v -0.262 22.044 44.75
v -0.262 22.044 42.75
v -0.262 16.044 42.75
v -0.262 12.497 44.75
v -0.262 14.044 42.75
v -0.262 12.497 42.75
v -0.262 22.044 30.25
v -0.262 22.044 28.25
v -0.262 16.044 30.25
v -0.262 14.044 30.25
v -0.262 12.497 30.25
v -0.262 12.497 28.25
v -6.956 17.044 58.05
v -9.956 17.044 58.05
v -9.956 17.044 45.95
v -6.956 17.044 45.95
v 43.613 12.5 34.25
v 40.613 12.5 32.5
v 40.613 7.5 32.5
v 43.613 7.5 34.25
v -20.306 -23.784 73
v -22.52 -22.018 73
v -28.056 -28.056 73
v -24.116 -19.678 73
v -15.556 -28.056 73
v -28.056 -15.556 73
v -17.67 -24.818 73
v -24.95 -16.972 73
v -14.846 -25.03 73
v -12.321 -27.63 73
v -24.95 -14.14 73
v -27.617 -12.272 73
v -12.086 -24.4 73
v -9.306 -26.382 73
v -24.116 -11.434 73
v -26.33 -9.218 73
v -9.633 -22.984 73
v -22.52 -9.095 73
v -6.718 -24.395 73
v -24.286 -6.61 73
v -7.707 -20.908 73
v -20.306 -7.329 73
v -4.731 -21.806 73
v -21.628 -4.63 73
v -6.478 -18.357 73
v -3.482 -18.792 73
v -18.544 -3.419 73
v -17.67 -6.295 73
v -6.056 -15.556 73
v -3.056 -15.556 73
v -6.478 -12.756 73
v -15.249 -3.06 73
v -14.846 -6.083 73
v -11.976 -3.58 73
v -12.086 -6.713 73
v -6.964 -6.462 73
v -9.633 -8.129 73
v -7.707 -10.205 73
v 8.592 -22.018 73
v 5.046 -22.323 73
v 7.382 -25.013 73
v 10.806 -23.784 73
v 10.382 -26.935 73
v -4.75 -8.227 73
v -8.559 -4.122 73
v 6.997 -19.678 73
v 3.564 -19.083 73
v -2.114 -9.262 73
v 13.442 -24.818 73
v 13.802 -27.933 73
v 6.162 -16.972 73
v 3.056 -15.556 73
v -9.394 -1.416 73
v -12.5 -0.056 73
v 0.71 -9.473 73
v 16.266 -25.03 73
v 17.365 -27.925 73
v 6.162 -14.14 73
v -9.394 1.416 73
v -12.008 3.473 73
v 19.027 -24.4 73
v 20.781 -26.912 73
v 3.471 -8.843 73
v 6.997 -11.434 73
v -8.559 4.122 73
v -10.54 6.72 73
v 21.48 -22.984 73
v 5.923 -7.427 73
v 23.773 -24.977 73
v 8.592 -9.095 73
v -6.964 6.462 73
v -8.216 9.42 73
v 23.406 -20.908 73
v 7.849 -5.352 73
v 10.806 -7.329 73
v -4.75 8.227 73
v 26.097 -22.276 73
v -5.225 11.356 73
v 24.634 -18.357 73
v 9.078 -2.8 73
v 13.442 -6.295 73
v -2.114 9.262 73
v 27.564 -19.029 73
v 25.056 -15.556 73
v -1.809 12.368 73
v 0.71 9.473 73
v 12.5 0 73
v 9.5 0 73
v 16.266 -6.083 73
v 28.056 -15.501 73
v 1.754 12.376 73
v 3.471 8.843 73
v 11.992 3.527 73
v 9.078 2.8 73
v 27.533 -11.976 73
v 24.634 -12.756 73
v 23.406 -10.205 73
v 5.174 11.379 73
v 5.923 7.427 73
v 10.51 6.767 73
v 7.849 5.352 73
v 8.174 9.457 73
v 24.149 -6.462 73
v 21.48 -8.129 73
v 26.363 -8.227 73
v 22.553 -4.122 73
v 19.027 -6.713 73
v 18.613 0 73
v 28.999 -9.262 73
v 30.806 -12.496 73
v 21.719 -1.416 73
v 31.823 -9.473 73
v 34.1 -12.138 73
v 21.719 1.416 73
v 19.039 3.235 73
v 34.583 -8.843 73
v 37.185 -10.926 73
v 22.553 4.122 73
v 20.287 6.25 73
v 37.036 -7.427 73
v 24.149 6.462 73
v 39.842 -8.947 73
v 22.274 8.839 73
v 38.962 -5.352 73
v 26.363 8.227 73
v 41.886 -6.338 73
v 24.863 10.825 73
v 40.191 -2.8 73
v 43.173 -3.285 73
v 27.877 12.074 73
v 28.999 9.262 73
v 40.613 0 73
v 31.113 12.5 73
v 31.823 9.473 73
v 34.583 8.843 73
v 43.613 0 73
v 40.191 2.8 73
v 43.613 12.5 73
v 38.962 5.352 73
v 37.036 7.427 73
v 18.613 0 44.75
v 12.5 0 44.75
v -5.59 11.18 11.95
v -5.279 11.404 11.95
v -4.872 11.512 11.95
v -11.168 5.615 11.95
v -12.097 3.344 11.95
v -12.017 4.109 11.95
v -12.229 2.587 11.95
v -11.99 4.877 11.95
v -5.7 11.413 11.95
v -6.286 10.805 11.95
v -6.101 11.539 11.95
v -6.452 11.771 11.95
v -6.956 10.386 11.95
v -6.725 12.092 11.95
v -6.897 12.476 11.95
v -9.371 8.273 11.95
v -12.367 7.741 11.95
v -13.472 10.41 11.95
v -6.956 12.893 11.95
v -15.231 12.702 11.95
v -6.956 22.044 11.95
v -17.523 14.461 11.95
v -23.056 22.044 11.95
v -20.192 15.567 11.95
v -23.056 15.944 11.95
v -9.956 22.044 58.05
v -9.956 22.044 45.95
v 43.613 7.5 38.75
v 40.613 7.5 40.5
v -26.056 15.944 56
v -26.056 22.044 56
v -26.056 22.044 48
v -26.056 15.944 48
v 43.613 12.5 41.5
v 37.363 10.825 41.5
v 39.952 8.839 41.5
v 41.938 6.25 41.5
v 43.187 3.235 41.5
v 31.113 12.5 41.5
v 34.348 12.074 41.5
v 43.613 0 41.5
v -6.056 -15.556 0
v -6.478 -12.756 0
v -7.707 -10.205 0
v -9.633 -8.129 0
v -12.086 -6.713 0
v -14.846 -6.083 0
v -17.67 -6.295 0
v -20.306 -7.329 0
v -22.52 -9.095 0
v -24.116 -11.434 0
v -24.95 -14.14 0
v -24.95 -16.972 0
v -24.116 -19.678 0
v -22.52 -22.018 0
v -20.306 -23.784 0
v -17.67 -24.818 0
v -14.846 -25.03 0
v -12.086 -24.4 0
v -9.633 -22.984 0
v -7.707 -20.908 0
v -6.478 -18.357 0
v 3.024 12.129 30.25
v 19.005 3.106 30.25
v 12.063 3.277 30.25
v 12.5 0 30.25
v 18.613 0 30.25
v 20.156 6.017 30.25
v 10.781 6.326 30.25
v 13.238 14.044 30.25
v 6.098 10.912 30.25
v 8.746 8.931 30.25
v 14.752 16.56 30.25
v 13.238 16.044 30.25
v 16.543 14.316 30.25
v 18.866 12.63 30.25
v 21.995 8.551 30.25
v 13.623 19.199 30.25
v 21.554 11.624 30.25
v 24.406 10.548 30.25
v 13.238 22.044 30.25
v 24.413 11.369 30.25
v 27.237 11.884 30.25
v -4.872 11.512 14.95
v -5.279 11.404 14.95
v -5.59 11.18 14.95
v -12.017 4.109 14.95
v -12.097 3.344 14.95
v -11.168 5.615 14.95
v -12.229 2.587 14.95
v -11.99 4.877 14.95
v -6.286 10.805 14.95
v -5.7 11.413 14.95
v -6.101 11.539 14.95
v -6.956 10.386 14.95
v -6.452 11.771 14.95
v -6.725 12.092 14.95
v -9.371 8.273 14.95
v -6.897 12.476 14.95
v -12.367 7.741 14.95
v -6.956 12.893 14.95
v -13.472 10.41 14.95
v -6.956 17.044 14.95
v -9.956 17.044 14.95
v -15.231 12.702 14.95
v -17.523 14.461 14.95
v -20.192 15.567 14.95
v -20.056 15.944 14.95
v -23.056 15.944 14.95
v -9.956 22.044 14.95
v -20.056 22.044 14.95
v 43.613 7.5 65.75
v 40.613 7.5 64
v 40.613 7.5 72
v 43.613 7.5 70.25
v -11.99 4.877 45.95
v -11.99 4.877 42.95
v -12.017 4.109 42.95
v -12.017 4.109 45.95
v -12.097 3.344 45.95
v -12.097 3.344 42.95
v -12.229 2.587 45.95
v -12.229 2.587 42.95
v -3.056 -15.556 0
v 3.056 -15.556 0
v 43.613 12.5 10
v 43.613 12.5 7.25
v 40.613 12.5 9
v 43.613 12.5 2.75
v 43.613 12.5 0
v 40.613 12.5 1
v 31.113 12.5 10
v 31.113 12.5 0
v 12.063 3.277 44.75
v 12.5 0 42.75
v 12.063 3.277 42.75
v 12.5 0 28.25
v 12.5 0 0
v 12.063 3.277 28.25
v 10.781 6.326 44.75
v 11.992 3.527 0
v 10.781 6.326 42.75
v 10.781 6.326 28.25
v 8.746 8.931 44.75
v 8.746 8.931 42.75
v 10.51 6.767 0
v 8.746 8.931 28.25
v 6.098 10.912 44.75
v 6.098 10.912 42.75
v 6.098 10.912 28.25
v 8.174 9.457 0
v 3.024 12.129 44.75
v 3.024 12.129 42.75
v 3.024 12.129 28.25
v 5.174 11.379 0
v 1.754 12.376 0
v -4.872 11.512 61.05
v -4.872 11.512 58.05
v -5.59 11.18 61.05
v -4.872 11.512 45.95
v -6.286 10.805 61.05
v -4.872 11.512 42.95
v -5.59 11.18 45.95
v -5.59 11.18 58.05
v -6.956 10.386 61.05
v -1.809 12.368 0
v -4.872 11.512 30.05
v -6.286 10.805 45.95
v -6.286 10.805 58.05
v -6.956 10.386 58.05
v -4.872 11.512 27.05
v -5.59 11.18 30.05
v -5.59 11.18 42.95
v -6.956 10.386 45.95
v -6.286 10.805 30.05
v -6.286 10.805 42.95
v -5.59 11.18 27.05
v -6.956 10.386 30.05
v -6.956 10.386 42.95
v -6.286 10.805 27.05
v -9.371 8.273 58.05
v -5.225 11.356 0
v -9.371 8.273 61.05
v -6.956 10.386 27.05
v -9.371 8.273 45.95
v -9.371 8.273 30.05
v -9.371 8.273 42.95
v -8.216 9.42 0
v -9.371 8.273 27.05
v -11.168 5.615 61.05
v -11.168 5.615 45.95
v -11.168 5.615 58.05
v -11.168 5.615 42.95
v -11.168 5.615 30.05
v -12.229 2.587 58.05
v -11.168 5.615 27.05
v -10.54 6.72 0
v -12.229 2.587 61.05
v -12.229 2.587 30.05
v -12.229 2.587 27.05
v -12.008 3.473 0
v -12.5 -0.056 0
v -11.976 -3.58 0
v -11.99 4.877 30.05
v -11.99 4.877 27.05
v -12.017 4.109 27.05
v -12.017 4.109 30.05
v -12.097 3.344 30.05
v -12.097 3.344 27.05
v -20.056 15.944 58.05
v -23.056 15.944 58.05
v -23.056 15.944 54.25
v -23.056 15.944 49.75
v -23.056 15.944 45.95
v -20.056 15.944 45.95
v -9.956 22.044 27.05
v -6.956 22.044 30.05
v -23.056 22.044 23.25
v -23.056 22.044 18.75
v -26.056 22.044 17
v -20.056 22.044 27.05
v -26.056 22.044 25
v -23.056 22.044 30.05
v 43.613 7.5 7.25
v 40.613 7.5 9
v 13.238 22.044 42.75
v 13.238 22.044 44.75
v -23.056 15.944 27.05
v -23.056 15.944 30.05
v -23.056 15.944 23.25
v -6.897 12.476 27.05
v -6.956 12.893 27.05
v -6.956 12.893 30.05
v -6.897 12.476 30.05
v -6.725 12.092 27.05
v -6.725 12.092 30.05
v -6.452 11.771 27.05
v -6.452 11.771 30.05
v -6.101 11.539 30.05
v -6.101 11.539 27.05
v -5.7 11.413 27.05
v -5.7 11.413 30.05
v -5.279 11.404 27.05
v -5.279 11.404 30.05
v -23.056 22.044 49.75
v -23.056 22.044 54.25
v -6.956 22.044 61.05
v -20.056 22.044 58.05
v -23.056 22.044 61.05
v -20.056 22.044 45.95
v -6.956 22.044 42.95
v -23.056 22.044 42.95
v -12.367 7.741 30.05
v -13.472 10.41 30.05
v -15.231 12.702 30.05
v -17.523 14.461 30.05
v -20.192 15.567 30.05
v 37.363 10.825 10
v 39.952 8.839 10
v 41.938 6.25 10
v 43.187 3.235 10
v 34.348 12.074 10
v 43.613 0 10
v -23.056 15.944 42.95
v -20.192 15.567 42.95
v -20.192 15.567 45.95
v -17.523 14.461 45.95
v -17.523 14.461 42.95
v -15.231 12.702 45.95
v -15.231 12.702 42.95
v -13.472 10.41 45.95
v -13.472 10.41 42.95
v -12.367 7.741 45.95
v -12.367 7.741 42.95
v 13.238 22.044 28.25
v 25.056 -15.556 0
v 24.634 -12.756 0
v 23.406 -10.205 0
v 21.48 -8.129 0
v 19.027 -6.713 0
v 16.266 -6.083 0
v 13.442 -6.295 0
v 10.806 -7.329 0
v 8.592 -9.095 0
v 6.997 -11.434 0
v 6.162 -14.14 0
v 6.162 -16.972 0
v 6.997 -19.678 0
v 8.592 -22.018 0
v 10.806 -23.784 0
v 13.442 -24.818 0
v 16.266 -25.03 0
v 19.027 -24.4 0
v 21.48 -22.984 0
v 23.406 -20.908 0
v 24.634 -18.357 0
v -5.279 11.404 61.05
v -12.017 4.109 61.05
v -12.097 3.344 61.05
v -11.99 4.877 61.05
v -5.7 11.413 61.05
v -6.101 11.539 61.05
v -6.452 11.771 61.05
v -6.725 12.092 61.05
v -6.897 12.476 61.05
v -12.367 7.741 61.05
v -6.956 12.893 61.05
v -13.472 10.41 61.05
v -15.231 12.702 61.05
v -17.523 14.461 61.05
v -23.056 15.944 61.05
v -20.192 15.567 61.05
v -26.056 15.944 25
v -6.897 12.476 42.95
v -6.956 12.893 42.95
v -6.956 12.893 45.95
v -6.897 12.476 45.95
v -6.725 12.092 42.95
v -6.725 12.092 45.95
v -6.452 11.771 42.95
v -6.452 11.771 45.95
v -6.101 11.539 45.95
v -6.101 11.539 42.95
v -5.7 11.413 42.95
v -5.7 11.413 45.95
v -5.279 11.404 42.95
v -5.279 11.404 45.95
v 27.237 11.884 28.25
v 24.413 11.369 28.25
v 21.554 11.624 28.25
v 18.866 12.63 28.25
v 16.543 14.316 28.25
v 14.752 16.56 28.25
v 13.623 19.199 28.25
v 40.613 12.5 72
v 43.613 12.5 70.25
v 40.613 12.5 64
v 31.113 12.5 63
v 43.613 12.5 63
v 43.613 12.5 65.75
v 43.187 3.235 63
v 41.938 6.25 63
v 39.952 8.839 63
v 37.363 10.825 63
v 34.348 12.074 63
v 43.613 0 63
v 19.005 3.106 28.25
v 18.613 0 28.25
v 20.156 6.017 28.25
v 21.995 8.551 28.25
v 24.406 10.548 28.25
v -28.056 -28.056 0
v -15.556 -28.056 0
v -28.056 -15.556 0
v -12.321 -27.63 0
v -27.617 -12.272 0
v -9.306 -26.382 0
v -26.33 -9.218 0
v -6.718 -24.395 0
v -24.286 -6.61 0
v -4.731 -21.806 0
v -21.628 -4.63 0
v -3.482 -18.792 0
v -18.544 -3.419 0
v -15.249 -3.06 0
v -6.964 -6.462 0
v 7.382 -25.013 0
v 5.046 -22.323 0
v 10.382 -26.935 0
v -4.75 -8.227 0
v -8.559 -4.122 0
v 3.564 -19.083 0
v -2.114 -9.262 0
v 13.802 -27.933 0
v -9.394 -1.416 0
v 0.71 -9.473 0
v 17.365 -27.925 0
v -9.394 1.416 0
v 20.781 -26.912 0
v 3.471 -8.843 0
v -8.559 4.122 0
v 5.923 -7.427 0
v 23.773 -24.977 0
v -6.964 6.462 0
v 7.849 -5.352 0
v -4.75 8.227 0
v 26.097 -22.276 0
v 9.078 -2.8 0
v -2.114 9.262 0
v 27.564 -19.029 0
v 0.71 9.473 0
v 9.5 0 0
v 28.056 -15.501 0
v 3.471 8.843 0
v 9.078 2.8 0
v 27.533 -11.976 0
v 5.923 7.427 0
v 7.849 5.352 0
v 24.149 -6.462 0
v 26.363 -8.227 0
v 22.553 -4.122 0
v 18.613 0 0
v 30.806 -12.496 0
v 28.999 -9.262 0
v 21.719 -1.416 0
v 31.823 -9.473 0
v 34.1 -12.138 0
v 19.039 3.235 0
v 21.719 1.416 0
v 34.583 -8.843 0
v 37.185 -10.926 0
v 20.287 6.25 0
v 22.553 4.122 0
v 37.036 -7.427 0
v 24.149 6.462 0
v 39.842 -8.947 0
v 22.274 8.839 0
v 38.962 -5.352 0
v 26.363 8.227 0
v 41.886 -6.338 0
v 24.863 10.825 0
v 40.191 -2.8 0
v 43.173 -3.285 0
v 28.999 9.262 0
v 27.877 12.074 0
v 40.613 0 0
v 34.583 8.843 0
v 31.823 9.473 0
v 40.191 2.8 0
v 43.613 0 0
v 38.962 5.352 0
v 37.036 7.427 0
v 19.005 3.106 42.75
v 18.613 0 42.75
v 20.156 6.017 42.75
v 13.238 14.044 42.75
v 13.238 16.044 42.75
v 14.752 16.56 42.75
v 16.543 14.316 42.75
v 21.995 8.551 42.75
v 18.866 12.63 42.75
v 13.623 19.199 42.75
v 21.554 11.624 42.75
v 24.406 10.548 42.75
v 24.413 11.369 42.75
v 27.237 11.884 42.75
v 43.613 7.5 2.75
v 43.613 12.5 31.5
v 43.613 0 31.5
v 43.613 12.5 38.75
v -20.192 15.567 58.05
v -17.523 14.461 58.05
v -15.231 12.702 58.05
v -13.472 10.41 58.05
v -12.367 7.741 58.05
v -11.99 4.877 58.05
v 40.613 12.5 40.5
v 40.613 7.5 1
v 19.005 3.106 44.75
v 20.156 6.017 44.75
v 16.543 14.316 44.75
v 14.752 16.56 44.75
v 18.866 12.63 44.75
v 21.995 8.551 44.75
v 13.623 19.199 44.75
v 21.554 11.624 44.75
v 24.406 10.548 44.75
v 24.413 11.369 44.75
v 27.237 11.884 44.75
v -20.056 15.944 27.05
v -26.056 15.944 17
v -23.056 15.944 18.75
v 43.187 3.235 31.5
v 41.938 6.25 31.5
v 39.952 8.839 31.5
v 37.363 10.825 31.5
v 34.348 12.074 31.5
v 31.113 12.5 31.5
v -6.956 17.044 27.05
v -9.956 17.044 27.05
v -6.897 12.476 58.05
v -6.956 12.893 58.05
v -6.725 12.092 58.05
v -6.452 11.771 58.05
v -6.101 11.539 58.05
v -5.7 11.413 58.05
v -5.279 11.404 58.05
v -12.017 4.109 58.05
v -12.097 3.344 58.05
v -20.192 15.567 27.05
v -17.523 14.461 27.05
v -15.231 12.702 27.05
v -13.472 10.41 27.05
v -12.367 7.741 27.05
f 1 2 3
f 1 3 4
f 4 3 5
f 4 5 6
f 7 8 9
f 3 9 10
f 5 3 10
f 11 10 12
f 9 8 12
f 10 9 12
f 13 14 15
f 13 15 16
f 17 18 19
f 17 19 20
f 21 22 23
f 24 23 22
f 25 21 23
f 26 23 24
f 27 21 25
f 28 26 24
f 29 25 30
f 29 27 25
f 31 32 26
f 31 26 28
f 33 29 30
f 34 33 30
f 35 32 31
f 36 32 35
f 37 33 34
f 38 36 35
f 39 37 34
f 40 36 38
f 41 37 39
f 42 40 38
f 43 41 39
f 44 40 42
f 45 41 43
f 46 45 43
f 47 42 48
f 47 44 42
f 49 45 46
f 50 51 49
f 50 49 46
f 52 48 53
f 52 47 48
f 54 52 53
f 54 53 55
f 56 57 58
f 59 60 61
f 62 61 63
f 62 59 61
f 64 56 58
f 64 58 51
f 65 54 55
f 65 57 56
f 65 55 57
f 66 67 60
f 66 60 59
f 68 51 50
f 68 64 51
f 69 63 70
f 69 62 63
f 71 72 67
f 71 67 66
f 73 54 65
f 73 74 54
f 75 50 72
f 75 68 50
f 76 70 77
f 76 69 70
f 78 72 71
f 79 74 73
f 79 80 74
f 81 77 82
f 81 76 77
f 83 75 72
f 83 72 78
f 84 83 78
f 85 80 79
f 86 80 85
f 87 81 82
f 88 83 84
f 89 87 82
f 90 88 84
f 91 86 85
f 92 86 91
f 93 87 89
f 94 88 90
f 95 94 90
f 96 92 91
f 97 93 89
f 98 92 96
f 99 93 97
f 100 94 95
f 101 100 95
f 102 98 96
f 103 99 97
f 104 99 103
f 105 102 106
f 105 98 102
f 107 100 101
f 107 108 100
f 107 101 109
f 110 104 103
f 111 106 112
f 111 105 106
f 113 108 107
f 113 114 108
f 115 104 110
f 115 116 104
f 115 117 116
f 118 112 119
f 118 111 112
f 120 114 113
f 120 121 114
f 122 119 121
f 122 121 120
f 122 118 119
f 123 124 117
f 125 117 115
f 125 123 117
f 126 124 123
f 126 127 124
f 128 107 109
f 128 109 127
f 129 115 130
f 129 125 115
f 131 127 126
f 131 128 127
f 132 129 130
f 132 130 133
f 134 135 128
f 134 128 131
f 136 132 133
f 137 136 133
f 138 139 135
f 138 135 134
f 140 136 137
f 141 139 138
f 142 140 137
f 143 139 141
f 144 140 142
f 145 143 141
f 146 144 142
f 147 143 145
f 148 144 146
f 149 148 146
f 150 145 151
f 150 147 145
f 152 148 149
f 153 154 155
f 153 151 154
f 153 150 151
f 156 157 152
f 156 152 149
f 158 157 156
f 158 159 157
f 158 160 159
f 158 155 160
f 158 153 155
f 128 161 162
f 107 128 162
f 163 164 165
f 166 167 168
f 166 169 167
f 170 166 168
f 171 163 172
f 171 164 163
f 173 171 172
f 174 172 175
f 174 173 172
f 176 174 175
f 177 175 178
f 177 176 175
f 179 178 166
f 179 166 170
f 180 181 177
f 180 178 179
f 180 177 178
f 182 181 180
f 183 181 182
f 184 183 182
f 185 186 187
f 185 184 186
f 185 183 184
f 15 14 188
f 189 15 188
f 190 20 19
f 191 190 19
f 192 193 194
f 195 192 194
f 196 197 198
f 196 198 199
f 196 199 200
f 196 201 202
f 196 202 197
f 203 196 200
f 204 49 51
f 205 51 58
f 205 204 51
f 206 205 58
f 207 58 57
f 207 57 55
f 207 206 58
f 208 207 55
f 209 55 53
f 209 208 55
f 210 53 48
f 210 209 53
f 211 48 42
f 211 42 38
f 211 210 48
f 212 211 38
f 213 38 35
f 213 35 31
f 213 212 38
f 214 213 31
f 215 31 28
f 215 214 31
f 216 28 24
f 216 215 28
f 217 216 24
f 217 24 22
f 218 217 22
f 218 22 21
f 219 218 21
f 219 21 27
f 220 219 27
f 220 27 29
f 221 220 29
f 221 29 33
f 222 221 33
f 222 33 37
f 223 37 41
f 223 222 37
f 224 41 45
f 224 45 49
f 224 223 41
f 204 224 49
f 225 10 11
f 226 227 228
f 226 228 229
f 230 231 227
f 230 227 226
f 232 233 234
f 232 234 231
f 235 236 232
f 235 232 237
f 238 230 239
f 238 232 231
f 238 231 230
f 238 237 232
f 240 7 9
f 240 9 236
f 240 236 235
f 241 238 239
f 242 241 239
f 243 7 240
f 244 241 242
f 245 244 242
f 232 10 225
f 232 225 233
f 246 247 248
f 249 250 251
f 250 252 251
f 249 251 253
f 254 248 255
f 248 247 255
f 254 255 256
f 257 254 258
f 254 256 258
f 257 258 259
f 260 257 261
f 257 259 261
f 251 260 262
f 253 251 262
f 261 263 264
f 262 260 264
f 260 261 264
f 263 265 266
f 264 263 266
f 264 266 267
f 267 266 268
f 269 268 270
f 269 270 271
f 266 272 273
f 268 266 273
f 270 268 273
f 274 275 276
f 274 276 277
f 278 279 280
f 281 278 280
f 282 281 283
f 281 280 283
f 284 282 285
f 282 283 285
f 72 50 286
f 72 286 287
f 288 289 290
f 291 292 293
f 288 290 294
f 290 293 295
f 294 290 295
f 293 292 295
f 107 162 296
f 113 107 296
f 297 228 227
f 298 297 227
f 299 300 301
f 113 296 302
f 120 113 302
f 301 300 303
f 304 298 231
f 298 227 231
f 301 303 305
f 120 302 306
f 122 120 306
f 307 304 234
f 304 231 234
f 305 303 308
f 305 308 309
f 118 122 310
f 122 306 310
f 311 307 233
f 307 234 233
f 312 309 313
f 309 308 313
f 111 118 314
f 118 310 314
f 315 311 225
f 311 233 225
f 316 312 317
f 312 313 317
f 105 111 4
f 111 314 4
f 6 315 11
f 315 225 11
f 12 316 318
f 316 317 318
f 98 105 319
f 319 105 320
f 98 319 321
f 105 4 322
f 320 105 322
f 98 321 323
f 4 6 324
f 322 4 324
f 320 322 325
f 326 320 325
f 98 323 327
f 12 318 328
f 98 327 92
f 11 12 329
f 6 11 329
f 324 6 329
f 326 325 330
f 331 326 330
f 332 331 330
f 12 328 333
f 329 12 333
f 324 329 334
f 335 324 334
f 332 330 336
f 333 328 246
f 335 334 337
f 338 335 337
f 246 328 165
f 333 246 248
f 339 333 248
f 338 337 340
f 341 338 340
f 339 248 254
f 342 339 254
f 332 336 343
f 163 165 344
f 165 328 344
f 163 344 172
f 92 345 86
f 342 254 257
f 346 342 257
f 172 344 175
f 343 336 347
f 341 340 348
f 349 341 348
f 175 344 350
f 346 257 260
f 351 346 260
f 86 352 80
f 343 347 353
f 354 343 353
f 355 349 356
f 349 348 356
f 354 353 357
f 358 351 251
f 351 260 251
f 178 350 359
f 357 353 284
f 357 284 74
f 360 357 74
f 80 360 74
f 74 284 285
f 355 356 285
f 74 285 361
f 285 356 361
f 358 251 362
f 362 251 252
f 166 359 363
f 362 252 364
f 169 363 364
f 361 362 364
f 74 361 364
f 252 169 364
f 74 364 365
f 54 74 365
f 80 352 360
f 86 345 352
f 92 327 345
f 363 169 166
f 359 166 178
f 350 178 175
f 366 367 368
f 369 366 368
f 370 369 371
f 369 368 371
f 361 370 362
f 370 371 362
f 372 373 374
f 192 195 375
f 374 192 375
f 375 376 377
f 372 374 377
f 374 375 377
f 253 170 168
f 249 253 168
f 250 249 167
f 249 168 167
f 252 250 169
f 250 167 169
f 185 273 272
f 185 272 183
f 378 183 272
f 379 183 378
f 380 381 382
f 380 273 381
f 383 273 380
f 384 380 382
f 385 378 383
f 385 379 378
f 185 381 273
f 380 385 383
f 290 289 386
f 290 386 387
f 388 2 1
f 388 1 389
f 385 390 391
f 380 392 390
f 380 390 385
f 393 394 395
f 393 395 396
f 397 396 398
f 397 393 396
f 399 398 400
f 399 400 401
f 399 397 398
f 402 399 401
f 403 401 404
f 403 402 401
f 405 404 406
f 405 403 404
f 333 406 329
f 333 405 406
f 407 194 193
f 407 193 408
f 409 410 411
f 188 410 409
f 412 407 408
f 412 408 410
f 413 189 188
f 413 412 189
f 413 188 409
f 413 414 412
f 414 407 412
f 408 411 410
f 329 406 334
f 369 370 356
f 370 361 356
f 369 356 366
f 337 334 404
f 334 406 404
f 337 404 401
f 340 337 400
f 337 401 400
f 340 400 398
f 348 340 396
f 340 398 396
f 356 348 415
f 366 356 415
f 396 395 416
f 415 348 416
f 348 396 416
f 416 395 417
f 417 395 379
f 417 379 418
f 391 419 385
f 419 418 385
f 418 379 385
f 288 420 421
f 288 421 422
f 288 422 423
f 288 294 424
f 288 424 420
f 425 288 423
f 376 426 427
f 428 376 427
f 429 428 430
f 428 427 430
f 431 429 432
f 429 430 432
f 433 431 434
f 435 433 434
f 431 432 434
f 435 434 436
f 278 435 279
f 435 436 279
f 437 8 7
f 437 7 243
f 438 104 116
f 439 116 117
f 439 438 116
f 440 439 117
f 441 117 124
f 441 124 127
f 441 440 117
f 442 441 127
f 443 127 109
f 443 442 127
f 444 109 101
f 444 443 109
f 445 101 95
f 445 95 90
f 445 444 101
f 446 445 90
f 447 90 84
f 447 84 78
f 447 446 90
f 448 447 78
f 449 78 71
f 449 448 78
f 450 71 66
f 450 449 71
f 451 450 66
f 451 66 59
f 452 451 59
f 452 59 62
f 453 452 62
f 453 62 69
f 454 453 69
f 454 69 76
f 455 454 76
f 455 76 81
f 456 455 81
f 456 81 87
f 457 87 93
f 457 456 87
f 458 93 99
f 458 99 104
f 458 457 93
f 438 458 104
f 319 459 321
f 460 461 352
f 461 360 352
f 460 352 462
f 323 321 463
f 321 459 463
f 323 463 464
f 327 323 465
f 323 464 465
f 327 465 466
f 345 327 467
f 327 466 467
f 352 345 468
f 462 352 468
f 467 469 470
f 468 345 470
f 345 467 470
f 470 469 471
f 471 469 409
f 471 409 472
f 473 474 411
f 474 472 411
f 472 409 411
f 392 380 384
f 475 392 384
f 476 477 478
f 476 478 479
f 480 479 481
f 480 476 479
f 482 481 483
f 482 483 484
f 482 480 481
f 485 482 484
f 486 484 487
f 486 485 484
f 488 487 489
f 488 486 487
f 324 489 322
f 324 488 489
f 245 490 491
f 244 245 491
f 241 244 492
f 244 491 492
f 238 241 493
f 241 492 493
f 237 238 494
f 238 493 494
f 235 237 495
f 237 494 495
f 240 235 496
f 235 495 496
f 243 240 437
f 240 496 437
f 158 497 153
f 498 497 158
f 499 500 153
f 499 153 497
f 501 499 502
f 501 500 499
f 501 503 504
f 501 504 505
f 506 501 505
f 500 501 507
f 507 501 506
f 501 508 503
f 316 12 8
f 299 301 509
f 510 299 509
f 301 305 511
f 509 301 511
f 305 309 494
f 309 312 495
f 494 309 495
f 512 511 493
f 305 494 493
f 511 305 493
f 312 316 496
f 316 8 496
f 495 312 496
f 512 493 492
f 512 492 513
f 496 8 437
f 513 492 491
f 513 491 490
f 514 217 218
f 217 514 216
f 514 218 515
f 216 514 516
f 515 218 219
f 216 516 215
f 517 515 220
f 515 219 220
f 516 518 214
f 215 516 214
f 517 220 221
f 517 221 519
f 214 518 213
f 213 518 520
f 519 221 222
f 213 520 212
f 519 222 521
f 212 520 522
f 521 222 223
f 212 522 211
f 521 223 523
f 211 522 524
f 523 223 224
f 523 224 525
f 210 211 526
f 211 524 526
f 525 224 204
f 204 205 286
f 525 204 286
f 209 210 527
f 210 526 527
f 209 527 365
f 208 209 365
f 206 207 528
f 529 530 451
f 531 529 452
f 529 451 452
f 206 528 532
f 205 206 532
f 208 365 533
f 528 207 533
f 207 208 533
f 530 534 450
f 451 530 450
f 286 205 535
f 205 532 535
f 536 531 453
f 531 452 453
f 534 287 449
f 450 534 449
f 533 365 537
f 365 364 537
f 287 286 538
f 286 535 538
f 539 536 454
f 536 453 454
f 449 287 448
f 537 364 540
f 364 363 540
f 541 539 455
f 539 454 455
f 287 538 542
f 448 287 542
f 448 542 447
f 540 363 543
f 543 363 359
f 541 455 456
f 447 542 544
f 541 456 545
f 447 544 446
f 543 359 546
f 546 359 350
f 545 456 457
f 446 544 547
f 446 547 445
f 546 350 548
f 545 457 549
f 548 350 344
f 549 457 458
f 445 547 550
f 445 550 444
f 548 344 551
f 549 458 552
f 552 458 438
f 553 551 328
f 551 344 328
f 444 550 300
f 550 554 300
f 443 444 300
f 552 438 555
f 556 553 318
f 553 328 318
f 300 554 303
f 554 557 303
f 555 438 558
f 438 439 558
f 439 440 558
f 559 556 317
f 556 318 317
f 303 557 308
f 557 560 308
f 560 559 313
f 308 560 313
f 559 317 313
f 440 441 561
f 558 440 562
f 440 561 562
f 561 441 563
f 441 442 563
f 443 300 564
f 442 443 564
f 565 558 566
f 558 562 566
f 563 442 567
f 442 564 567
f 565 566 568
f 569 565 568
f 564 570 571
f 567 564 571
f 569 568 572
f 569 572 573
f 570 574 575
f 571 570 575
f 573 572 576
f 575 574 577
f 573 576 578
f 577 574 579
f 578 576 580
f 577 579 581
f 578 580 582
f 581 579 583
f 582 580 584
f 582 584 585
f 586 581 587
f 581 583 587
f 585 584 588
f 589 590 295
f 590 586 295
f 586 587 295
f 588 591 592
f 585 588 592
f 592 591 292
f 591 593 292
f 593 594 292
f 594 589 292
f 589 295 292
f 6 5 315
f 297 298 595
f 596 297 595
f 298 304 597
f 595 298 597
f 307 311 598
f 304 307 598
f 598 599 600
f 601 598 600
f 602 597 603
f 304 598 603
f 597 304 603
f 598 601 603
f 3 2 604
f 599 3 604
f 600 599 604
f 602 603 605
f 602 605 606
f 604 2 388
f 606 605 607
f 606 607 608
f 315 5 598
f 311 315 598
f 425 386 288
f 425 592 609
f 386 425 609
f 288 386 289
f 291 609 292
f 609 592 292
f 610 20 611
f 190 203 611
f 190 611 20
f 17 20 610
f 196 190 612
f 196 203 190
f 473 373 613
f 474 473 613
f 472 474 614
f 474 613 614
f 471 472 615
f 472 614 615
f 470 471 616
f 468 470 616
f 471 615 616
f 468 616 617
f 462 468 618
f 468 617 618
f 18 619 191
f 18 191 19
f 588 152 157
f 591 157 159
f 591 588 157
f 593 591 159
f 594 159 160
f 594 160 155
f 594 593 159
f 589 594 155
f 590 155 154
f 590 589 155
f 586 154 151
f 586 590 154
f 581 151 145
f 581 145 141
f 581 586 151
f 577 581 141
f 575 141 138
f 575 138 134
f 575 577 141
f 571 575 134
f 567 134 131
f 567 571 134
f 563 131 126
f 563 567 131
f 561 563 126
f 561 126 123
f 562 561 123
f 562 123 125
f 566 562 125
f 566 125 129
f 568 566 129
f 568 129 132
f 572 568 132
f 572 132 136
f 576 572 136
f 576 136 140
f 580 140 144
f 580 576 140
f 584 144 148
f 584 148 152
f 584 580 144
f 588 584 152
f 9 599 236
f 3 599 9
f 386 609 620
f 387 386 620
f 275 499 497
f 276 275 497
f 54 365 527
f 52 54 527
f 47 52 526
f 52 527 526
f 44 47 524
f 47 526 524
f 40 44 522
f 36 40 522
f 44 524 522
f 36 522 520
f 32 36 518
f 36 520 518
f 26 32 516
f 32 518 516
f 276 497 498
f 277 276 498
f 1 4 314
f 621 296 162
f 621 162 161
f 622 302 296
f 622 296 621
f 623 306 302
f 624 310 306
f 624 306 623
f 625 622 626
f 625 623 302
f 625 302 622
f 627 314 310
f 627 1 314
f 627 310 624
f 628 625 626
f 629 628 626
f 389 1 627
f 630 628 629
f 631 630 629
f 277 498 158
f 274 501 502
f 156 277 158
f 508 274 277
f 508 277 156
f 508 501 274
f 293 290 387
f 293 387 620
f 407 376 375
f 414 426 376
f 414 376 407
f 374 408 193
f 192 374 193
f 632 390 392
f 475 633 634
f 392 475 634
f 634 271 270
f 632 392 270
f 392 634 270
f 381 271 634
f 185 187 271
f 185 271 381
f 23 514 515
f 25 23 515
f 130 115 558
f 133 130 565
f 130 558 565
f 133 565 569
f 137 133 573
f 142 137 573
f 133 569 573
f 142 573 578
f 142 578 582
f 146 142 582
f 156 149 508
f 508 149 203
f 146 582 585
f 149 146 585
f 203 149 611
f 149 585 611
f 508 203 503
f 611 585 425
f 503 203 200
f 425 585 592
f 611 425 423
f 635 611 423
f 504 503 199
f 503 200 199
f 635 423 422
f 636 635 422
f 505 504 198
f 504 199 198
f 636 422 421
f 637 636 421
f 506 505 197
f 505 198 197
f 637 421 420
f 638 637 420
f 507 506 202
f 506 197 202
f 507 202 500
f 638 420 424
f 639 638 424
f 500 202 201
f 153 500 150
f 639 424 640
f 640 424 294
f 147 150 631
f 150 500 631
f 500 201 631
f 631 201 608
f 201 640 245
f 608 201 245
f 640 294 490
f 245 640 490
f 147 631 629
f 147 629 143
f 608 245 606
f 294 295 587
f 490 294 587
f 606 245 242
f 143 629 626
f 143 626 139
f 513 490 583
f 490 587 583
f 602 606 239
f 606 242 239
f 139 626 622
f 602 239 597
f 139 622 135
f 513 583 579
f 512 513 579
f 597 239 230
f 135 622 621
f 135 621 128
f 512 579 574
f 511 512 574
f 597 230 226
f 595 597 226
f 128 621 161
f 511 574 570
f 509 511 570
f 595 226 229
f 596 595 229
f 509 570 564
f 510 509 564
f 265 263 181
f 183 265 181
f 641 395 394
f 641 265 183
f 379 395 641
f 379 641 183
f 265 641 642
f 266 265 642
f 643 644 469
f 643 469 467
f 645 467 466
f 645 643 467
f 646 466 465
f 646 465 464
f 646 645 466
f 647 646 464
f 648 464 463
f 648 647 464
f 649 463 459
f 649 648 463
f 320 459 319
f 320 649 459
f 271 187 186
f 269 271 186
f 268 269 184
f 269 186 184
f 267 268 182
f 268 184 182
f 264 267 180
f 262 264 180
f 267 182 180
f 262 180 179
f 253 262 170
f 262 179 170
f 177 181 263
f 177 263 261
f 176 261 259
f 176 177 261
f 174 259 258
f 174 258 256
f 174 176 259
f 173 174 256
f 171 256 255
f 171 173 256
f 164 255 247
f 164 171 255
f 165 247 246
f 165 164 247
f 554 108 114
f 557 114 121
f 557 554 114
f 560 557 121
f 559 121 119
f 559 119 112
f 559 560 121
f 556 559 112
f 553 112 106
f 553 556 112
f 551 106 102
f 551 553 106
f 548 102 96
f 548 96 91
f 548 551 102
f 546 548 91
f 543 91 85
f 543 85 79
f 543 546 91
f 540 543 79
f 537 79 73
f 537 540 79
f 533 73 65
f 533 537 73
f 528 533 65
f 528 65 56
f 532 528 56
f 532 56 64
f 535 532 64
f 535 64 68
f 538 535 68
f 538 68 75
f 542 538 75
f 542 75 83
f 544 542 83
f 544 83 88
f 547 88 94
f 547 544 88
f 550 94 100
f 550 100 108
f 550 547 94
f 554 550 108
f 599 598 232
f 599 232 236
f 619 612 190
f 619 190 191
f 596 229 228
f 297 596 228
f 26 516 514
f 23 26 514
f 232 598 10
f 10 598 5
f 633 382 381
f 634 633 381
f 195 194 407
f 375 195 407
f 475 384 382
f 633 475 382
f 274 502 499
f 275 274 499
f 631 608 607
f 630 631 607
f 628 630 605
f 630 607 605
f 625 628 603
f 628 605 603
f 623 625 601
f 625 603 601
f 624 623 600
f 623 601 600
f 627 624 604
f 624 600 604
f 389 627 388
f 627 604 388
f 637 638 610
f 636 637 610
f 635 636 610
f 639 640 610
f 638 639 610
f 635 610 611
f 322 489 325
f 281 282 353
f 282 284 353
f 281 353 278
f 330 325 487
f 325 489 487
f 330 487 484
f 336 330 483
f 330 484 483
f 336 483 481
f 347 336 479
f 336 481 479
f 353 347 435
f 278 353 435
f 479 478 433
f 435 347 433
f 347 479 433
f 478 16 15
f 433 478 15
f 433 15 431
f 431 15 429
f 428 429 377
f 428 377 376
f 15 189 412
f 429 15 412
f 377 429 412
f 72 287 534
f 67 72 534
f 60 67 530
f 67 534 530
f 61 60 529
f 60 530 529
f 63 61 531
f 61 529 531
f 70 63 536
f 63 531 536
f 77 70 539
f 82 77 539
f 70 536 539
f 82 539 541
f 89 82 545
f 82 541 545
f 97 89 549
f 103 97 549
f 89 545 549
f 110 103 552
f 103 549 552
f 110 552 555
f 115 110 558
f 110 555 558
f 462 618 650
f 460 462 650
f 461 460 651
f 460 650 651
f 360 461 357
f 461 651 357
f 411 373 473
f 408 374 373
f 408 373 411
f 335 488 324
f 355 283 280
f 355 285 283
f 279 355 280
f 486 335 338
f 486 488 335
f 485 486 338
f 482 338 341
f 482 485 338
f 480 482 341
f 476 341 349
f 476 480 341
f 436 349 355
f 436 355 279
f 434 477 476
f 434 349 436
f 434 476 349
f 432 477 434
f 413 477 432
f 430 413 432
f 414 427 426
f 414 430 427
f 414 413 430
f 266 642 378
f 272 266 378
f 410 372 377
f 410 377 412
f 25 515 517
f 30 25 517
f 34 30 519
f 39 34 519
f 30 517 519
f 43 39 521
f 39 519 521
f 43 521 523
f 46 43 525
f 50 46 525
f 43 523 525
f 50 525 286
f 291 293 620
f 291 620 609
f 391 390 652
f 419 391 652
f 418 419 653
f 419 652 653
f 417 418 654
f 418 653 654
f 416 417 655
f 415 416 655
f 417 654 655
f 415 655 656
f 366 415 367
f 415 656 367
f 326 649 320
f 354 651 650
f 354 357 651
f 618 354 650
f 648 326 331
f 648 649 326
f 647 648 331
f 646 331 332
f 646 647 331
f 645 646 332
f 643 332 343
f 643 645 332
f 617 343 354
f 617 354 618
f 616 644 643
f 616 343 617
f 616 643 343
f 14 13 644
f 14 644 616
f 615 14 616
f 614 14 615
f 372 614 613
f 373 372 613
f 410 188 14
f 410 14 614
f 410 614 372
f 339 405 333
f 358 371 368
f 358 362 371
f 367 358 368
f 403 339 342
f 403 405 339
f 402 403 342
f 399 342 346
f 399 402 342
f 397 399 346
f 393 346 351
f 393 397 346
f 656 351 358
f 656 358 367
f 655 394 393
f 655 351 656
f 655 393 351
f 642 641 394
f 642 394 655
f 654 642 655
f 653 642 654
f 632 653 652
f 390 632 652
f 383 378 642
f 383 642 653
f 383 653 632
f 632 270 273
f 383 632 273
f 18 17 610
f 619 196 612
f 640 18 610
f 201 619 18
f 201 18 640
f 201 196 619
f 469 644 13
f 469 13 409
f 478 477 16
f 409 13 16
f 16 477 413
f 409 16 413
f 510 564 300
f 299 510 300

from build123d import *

# Parameters (mm, degrees)
SKETCH_1_R          = 9.5
EXTRUDE_2_DEPTH     = 73
EXTRUDE_START       = -3
EXTRUDE_3_DEPTH     = 3
EXTRUDE_4_DEPTH     = 3
EXTRUDE_5_DEPTH     = 3
EXTRUDE_6_DEPTH     = 3
SKETCH_8_W          = 3
SKETCH_8_H          = 6.1
EXTRUDE_7_DEPTH     = 12.1
SKETCH_9_W          = 3
SKETCH_9_H          = 6.1
EXTRUDE_8_DEPTH     = 12.1
SKETCH_10_W         = 3
SKETCH_10_H         = 5
EXTRUDE_9_DEPTH     = 12.1
SKETCH_11_W         = 3
SKETCH_11_H         = 5
EXTRUDE_10_DEPTH    = 12.1
EXTRUDE_11_DEPTH    = 3
EXTRUDE_12_DEPTH    = 3
EXTRUDE_13_DEPTH    = 3
EXTRUDE_14_DEPTH    = 3
EXTRUDE_15_DEPTH    = 6.1
SKETCH_18_W         = 13.5
SKETCH_18_H         = 6
EXTRUDE_16_DEPTH    = 2
EXTRUDE_START_2     = -2
SKETCH_19_W         = 13.5
SKETCH_19_H         = 6
EXTRUDE_17_DEPTH    = 2
SKETCH_20_W         = 13.5
SKETCH_20_H         = 2
EXTRUDE_18_DEPTH    = 12.5
EXTRUDE_START_3     = -10
EXTRUDE_19_DEPTH    = 10
EXTRUDE_20_DEPTH    = 10
EXTRUDE_START_4     = 36.5
EXTRUDE_21_DEPTH    = 5
CUT_EXTRUDE_1_DEPTH = 5


with BuildPart() as part:
    # Эскиз1 → Бобышка-Вытянуть2 (new body)
    with BuildSketch(Plane.XY):
        with BuildLine():
            Line((-28.056349186, -15.556349186), (-28.056349186, -28.056349186))
            Line((-28.056349186, -28.056349186), (-15.556349186, -28.056349186))
            ThreePointArc((-15.556349186, -28.056349186), (-6.717514421, -24.395183951), (-3.056349186, -15.556349186))
            Line((-3.056349186, -15.556349186), (3.056349186, -15.556349186))
            ThreePointArc((3.056349186, -15.556349186), (17.365374305, -27.924753615), (27.532737685, -11.976388499))
            ThreePointArc((27.532737685, -11.976388499), (41.137654945, 7.466608715), (18.612698372, 0))
            Line((18.612698372, 0), (12.5, 0))
            ThreePointArc((12.5, 0), (-1.809025119, 12.368404429), (-11.976388499, -3.579960687))
            ThreePointArc((-11.976388499, -3.579960687), (-23.022957901, -5.531392613), (-28.056349186, -15.556349186))
        make_face()
        with Locations((-15.556349186, -15.556349186)):
            Circle(SKETCH_1_R, mode=Mode.SUBTRACT)
        with Locations((15.556349186, -15.556349186)):
            Circle(SKETCH_1_R, mode=Mode.SUBTRACT)
        Circle(SKETCH_1_R, mode=Mode.SUBTRACT)
        with Locations((31.112698372, 0)):
            Circle(SKETCH_1_R, mode=Mode.SUBTRACT)
    extrude(amount=EXTRUDE_2_DEPTH)

    # Эскиз4 → Бобышка-Вытянуть3 (add)
    with BuildSketch(Plane.XY.offset(61.05).offset(EXTRUDE_START)):
        with BuildLine():
            ThreePointArc((-12.229391425, 2.586887198), (-10.355088747, 7.001581039), (-6.956349186, 10.385528682))
            Line((-6.956349186, 10.385528682), (-6.956349186, 22.043650814))
            Line((-6.956349186, 22.043650814), (-23.056349186, 22.043650814))
            Line((-23.056349186, 22.043650814), (-23.056349186, 15.943650814))
            ThreePointArc((-23.056349186, 15.943650814), (-15.231128181, 12.702338145), (-11.989815512, 4.87711714))
            ThreePointArc((-11.989815512, 4.87711714), (-12.049872452, 3.725753839), (-12.229391425, 2.586887198))
        make_face()
    extrude(amount=EXTRUDE_3_DEPTH)

    # Эскиз5 → Бобышка-Вытянуть4 (add)
    with BuildSketch(Plane.XY.offset(11.95)):
        with BuildLine():
            ThreePointArc((-12.229391425, 2.586887198), (-10.355088747, 7.001581039), (-6.956349186, 10.385528682))
            Line((-6.956349186, 10.385528682), (-6.956349186, 22.043650814))
            Line((-6.956349186, 22.043650814), (-23.056349186, 22.043650814))
            Line((-23.056349186, 22.043650814), (-23.056349186, 15.943650814))
            ThreePointArc((-23.056349186, 15.943650814), (-15.231128181, 12.702338145), (-11.989815512, 4.87711714))
            ThreePointArc((-11.989815512, 4.87711714), (-12.049872452, 3.725753839), (-12.229391425, 2.586887198))
        make_face()
    extrude(amount=EXTRUDE_4_DEPTH)

    # Эскиз7 → Бобышка-Вытянуть6 (add)
    with BuildSketch(Plane.XY.offset(30.05).offset(EXTRUDE_START)):
        with BuildLine():
            ThreePointArc((-12.229391425, 2.586887198), (-10.355088747, 7.001581039), (-6.956349186, 10.385528682))
            Line((-6.956349186, 10.385528682), (-6.956349186, 22.043650814))
            Line((-6.956349186, 22.043650814), (-23.056349186, 22.043650814))
            Line((-23.056349186, 22.043650814), (-23.056349186, 15.943650814))
            ThreePointArc((-23.056349186, 15.943650814), (-15.231128181, 12.702338145), (-11.989815512, 4.87711714))
            ThreePointArc((-11.989815512, 4.87711714), (-12.049872452, 3.725753839), (-12.229391425, 2.586887198))
        make_face()
    extrude(amount=EXTRUDE_6_DEPTH)

    # Эскиз8 → Бобышка-Вытянуть7 (add)
    with BuildSketch(Plane.XY.offset(14.95)):
        with Locations((-21.556349186, 18.993650814)):
            Rectangle(SKETCH_8_W, SKETCH_8_H)
    extrude(amount=EXTRUDE_7_DEPTH)



with BuildPart() as body_2:
    # Эскиз6 → Бобышка-Вытянуть5 (new body)
    with BuildSketch(Plane.XY.offset(42.95)):
        with BuildLine():
            ThreePointArc((-12.229391425, 2.586887198), (-10.355088747, 7.001581039), (-6.956349186, 10.385528682))
            Line((-6.956349186, 10.385528682), (-6.956349186, 22.043650814))
            Line((-6.956349186, 22.043650814), (-23.056349186, 22.043650814))
            Line((-23.056349186, 22.043650814), (-23.056349186, 15.943650814))
            ThreePointArc((-23.056349186, 15.943650814), (-15.231128181, 12.702338145), (-11.989815512, 4.87711714))
            ThreePointArc((-11.989815512, 4.87711714), (-12.049872452, 3.725753839), (-12.229391425, 2.586887198))
        make_face()
    extrude(amount=EXTRUDE_5_DEPTH)


with BuildPart() as part_1:
    add(part.part)

    add(body_2.part)  # Бобышка-Вытянуть8 merges body 2
    # Эскиз9 → Бобышка-Вытянуть8 (add)
    with BuildSketch(Plane.XY.offset(45.95)):
        with Locations((-21.556349186, 18.993650814)):
            Rectangle(SKETCH_9_W, SKETCH_9_H)
    extrude(amount=EXTRUDE_8_DEPTH)

    # Эскиз10 → Бобышка-Вытянуть9 (add)
    with BuildSketch(Plane.XY.offset(45.95)):
        with Locations((-8.456349186, 19.543650814)):
            Rectangle(SKETCH_10_W, SKETCH_10_H)
    extrude(amount=EXTRUDE_9_DEPTH)

    # Эскиз11 → Бобышка-Вытянуть10 (add)
    with BuildSketch(Plane(origin=(0, 0, 27.05), x_dir=(-1, 0, 0), z_dir=(0, 0, -1))):
        with Locations((8.456349186, 19.543650814)):
            Rectangle(SKETCH_11_W, SKETCH_11_H)
    extrude(amount=EXTRUDE_10_DEPTH)

    # Эскиз12 → Бобышка-Вытянуть11 (add)
    with BuildSketch(Plane(origin=(0, 0, 11.95), x_dir=(-1, 0, 0), z_dir=(0, 0, -1))):
        with BuildLine():
            Line((6.956349186, 10.385528682), (6.956349186, 12.89295364))
            ThreePointArc((6.956349186, 12.89295364), (6.284928313, 11.642571046), (4.871740345, 11.51156575))
            ThreePointArc((4.871740345, 11.51156575), (5.940784069, 10.998049129), (6.956349186, 10.385528682))
        make_face()
    extrude(amount=-EXTRUDE_11_DEPTH)

    # Эскиз13 → Бобышка-Вытянуть12 (add)
    with BuildSketch(Plane(origin=(0, 0, 27.05), x_dir=(-1, 0, 0), z_dir=(0, 0, -1))):
        with BuildLine():
            Line((6.956349186, 10.385528682), (6.956349186, 12.89295364))
            ThreePointArc((6.956349186, 12.89295364), (6.284928313, 11.642571046), (4.871740345, 11.51156575))
            ThreePointArc((4.871740345, 11.51156575), (5.940784069, 10.998049129), (6.956349186, 10.385528682))
        make_face()
    extrude(amount=-EXTRUDE_12_DEPTH)

    # Эскиз14 → Бобышка-Вытянуть13 (add)
    with BuildSketch(Plane(origin=(0, 0, 42.95), x_dir=(-1, 0, 0), z_dir=(0, 0, -1))):
        with BuildLine():
            Line((6.956349186, 10.385528682), (6.956349186, 12.89295364))
            ThreePointArc((6.956349186, 12.89295364), (6.284928313, 11.642571046), (4.871740345, 11.51156575))
            ThreePointArc((4.871740345, 11.51156575), (5.940784069, 10.998049129), (6.956349186, 10.385528682))
        make_face()
    extrude(amount=-EXTRUDE_13_DEPTH)

    # Эскиз15 → Бобышка-Вытянуть14 (add)
    with BuildSketch(Plane(origin=(0, 0, 58.05), x_dir=(-1, 0, 0), z_dir=(0, 0, -1))):
        with BuildLine():
            Line((6.956349186, 10.385528682), (6.956349186, 12.89295364))
            ThreePointArc((6.956349186, 12.89295364), (6.284928313, 11.642571046), (4.871740345, 11.51156575))
            ThreePointArc((4.871740345, 11.51156575), (5.940784069, 10.998049129), (6.956349186, 10.385528682))
        make_face()
    extrude(amount=-EXTRUDE_14_DEPTH)

    # Эскиз16 → Бобышка-Вытянуть15 (add)
    with BuildSketch(Plane.XZ.offset(-22.043650814)):
        Polygon((-23.056349186, 18.75), (-23.056349186, 23.25), (-26.056349186, 25), (-26.056349186, 17), align=None)
        Polygon((-23.056349186, 49.75), (-23.056349186, 54.25), (-26.056349186, 56), (-26.056349186, 48), align=None)
    extrude(amount=EXTRUDE_15_DEPTH)

    # Эскиз18 → Бобышка-Вытянуть16 (add)
    with BuildSketch(Plane.XY.offset(42.75)):
        with BuildLine():
            Line((13.237836074, 16.043650814), (-0.262163926, 16.043650814))
            Line((-0.262163926, 16.043650814), (-0.262163926, 12.497250501))
            ThreePointArc((-0.262163926, 12.497250501), (8.745654662, 8.931042746), (12.5, 0))
            Line((12.5, 0), (18.612698372, 0))
            ThreePointArc((18.612698372, 0), (20.996031333, 7.341869518), (27.237186055, 11.884039897))
            ThreePointArc((27.237186055, 11.884039897), (17.647498042, 13.394958805), (13.237836074, 22.043650814))
            Line((13.237836074, 22.043650814), (13.237836074, 16.043650814))
        make_face()
        with Locations((6.487836074, 19.043650814)):
            Rectangle(SKETCH_18_W, SKETCH_18_H)
    extrude(amount=EXTRUDE_16_DEPTH)

    # Эскиз19 → Бобышка-Вытянуть17 (add)
    with BuildSketch(Plane.XY.offset(30.25).offset(EXTRUDE_START_2)):
        with BuildLine():
            Line((13.237836074, 16.043650814), (-0.262163926, 16.043650814))
            Line((-0.262163926, 16.043650814), (-0.262163926, 12.497250501))
            ThreePointArc((-0.262163926, 12.497250501), (8.745654662, 8.931042746), (12.5, 0))
            Line((12.5, 0), (18.612698372, 0))
            ThreePointArc((18.612698372, 0), (20.996031333, 7.341869518), (27.237186055, 11.884039897))
            ThreePointArc((27.237186055, 11.884039897), (17.647498042, 13.394958805), (13.237836074, 22.043650814))
            Line((13.237836074, 22.043650814), (13.237836074, 16.043650814))
        make_face()
        with Locations((6.487836074, 19.043650814)):
            Rectangle(SKETCH_19_W, SKETCH_19_H)
    extrude(amount=EXTRUDE_17_DEPTH)

    # Эскиз20 → Бобышка-Вытянуть18 (add)
    with BuildSketch(Plane(origin=(0, 0, 42.75), x_dir=(-1, 0, 0), z_dir=(0, 0, -1))):
        with Locations((-6.487836074, 15.043650814)):
            Rectangle(SKETCH_20_W, SKETCH_20_H)
    extrude(amount=EXTRUDE_18_DEPTH)

    # Эскиз22 → Бобышка-Вытянуть19 (add)
    with BuildSketch(Plane.XY.offset(73).offset(EXTRUDE_START_3)):
        with BuildLine():
            Line((31.112698372, 12.5), (43.612698372, 12.5))
            Line((43.612698372, 12.5), (43.612698372, 0))
            ThreePointArc((43.612698372, 0), (39.951533137, 8.838834765), (31.112698372, 12.5))
        make_face()
    extrude(amount=EXTRUDE_19_DEPTH)

    # Эскиз23 → Бобышка-Вытянуть20 (add)
    with BuildSketch(Plane.XY):
        with BuildLine():
            Line((43.612698372, 12.5), (31.112698372, 12.5))
            ThreePointArc((31.112698372, 12.5), (39.951533137, 8.838834765), (43.612698372, 0))
            Line((43.612698372, 0), (43.612698372, 12.5))
        make_face()
    extrude(amount=EXTRUDE_20_DEPTH)

    # Эскиз24 → Бобышка-Вытянуть21 (add, symmetric)
    with BuildSketch(Plane.XY.offset(EXTRUDE_START_4)):
        with BuildLine():
            Line((43.612698372, 12.5), (31.112698372, 12.5))
            ThreePointArc((31.112698372, 12.5), (39.951533137, 8.838834765), (43.612698372, 0))
            Line((43.612698372, 0), (43.612698372, 12.5))
        make_face()
    extrude(amount=EXTRUDE_21_DEPTH, both=True)

    # Эскиз25 → Вырез-Вытянуть1 (cut)
    with BuildSketch(Plane(origin=(0, 12.5, 0), x_dir=(1, 0, 0), z_dir=(0, 1, 0))):
        Polygon((43.612698372, -65.75), (40.612698372, -64), (40.612698372, -72), (43.612698372, -70.25), align=None)
        Polygon((40.612698372, -32.5), (43.612698372, -34.25), (43.612698372, -38.75), (40.612698372, -40.5), align=None)
        Polygon((43.612698372, -2.75), (43.612698372, -7.25), (40.612698372, -9), (40.612698372, -1), align=None)
    extrude(amount=-CUT_EXTRUDE_1_DEPTH, mode=Mode.SUBTRACT)


solid = part_1.part
